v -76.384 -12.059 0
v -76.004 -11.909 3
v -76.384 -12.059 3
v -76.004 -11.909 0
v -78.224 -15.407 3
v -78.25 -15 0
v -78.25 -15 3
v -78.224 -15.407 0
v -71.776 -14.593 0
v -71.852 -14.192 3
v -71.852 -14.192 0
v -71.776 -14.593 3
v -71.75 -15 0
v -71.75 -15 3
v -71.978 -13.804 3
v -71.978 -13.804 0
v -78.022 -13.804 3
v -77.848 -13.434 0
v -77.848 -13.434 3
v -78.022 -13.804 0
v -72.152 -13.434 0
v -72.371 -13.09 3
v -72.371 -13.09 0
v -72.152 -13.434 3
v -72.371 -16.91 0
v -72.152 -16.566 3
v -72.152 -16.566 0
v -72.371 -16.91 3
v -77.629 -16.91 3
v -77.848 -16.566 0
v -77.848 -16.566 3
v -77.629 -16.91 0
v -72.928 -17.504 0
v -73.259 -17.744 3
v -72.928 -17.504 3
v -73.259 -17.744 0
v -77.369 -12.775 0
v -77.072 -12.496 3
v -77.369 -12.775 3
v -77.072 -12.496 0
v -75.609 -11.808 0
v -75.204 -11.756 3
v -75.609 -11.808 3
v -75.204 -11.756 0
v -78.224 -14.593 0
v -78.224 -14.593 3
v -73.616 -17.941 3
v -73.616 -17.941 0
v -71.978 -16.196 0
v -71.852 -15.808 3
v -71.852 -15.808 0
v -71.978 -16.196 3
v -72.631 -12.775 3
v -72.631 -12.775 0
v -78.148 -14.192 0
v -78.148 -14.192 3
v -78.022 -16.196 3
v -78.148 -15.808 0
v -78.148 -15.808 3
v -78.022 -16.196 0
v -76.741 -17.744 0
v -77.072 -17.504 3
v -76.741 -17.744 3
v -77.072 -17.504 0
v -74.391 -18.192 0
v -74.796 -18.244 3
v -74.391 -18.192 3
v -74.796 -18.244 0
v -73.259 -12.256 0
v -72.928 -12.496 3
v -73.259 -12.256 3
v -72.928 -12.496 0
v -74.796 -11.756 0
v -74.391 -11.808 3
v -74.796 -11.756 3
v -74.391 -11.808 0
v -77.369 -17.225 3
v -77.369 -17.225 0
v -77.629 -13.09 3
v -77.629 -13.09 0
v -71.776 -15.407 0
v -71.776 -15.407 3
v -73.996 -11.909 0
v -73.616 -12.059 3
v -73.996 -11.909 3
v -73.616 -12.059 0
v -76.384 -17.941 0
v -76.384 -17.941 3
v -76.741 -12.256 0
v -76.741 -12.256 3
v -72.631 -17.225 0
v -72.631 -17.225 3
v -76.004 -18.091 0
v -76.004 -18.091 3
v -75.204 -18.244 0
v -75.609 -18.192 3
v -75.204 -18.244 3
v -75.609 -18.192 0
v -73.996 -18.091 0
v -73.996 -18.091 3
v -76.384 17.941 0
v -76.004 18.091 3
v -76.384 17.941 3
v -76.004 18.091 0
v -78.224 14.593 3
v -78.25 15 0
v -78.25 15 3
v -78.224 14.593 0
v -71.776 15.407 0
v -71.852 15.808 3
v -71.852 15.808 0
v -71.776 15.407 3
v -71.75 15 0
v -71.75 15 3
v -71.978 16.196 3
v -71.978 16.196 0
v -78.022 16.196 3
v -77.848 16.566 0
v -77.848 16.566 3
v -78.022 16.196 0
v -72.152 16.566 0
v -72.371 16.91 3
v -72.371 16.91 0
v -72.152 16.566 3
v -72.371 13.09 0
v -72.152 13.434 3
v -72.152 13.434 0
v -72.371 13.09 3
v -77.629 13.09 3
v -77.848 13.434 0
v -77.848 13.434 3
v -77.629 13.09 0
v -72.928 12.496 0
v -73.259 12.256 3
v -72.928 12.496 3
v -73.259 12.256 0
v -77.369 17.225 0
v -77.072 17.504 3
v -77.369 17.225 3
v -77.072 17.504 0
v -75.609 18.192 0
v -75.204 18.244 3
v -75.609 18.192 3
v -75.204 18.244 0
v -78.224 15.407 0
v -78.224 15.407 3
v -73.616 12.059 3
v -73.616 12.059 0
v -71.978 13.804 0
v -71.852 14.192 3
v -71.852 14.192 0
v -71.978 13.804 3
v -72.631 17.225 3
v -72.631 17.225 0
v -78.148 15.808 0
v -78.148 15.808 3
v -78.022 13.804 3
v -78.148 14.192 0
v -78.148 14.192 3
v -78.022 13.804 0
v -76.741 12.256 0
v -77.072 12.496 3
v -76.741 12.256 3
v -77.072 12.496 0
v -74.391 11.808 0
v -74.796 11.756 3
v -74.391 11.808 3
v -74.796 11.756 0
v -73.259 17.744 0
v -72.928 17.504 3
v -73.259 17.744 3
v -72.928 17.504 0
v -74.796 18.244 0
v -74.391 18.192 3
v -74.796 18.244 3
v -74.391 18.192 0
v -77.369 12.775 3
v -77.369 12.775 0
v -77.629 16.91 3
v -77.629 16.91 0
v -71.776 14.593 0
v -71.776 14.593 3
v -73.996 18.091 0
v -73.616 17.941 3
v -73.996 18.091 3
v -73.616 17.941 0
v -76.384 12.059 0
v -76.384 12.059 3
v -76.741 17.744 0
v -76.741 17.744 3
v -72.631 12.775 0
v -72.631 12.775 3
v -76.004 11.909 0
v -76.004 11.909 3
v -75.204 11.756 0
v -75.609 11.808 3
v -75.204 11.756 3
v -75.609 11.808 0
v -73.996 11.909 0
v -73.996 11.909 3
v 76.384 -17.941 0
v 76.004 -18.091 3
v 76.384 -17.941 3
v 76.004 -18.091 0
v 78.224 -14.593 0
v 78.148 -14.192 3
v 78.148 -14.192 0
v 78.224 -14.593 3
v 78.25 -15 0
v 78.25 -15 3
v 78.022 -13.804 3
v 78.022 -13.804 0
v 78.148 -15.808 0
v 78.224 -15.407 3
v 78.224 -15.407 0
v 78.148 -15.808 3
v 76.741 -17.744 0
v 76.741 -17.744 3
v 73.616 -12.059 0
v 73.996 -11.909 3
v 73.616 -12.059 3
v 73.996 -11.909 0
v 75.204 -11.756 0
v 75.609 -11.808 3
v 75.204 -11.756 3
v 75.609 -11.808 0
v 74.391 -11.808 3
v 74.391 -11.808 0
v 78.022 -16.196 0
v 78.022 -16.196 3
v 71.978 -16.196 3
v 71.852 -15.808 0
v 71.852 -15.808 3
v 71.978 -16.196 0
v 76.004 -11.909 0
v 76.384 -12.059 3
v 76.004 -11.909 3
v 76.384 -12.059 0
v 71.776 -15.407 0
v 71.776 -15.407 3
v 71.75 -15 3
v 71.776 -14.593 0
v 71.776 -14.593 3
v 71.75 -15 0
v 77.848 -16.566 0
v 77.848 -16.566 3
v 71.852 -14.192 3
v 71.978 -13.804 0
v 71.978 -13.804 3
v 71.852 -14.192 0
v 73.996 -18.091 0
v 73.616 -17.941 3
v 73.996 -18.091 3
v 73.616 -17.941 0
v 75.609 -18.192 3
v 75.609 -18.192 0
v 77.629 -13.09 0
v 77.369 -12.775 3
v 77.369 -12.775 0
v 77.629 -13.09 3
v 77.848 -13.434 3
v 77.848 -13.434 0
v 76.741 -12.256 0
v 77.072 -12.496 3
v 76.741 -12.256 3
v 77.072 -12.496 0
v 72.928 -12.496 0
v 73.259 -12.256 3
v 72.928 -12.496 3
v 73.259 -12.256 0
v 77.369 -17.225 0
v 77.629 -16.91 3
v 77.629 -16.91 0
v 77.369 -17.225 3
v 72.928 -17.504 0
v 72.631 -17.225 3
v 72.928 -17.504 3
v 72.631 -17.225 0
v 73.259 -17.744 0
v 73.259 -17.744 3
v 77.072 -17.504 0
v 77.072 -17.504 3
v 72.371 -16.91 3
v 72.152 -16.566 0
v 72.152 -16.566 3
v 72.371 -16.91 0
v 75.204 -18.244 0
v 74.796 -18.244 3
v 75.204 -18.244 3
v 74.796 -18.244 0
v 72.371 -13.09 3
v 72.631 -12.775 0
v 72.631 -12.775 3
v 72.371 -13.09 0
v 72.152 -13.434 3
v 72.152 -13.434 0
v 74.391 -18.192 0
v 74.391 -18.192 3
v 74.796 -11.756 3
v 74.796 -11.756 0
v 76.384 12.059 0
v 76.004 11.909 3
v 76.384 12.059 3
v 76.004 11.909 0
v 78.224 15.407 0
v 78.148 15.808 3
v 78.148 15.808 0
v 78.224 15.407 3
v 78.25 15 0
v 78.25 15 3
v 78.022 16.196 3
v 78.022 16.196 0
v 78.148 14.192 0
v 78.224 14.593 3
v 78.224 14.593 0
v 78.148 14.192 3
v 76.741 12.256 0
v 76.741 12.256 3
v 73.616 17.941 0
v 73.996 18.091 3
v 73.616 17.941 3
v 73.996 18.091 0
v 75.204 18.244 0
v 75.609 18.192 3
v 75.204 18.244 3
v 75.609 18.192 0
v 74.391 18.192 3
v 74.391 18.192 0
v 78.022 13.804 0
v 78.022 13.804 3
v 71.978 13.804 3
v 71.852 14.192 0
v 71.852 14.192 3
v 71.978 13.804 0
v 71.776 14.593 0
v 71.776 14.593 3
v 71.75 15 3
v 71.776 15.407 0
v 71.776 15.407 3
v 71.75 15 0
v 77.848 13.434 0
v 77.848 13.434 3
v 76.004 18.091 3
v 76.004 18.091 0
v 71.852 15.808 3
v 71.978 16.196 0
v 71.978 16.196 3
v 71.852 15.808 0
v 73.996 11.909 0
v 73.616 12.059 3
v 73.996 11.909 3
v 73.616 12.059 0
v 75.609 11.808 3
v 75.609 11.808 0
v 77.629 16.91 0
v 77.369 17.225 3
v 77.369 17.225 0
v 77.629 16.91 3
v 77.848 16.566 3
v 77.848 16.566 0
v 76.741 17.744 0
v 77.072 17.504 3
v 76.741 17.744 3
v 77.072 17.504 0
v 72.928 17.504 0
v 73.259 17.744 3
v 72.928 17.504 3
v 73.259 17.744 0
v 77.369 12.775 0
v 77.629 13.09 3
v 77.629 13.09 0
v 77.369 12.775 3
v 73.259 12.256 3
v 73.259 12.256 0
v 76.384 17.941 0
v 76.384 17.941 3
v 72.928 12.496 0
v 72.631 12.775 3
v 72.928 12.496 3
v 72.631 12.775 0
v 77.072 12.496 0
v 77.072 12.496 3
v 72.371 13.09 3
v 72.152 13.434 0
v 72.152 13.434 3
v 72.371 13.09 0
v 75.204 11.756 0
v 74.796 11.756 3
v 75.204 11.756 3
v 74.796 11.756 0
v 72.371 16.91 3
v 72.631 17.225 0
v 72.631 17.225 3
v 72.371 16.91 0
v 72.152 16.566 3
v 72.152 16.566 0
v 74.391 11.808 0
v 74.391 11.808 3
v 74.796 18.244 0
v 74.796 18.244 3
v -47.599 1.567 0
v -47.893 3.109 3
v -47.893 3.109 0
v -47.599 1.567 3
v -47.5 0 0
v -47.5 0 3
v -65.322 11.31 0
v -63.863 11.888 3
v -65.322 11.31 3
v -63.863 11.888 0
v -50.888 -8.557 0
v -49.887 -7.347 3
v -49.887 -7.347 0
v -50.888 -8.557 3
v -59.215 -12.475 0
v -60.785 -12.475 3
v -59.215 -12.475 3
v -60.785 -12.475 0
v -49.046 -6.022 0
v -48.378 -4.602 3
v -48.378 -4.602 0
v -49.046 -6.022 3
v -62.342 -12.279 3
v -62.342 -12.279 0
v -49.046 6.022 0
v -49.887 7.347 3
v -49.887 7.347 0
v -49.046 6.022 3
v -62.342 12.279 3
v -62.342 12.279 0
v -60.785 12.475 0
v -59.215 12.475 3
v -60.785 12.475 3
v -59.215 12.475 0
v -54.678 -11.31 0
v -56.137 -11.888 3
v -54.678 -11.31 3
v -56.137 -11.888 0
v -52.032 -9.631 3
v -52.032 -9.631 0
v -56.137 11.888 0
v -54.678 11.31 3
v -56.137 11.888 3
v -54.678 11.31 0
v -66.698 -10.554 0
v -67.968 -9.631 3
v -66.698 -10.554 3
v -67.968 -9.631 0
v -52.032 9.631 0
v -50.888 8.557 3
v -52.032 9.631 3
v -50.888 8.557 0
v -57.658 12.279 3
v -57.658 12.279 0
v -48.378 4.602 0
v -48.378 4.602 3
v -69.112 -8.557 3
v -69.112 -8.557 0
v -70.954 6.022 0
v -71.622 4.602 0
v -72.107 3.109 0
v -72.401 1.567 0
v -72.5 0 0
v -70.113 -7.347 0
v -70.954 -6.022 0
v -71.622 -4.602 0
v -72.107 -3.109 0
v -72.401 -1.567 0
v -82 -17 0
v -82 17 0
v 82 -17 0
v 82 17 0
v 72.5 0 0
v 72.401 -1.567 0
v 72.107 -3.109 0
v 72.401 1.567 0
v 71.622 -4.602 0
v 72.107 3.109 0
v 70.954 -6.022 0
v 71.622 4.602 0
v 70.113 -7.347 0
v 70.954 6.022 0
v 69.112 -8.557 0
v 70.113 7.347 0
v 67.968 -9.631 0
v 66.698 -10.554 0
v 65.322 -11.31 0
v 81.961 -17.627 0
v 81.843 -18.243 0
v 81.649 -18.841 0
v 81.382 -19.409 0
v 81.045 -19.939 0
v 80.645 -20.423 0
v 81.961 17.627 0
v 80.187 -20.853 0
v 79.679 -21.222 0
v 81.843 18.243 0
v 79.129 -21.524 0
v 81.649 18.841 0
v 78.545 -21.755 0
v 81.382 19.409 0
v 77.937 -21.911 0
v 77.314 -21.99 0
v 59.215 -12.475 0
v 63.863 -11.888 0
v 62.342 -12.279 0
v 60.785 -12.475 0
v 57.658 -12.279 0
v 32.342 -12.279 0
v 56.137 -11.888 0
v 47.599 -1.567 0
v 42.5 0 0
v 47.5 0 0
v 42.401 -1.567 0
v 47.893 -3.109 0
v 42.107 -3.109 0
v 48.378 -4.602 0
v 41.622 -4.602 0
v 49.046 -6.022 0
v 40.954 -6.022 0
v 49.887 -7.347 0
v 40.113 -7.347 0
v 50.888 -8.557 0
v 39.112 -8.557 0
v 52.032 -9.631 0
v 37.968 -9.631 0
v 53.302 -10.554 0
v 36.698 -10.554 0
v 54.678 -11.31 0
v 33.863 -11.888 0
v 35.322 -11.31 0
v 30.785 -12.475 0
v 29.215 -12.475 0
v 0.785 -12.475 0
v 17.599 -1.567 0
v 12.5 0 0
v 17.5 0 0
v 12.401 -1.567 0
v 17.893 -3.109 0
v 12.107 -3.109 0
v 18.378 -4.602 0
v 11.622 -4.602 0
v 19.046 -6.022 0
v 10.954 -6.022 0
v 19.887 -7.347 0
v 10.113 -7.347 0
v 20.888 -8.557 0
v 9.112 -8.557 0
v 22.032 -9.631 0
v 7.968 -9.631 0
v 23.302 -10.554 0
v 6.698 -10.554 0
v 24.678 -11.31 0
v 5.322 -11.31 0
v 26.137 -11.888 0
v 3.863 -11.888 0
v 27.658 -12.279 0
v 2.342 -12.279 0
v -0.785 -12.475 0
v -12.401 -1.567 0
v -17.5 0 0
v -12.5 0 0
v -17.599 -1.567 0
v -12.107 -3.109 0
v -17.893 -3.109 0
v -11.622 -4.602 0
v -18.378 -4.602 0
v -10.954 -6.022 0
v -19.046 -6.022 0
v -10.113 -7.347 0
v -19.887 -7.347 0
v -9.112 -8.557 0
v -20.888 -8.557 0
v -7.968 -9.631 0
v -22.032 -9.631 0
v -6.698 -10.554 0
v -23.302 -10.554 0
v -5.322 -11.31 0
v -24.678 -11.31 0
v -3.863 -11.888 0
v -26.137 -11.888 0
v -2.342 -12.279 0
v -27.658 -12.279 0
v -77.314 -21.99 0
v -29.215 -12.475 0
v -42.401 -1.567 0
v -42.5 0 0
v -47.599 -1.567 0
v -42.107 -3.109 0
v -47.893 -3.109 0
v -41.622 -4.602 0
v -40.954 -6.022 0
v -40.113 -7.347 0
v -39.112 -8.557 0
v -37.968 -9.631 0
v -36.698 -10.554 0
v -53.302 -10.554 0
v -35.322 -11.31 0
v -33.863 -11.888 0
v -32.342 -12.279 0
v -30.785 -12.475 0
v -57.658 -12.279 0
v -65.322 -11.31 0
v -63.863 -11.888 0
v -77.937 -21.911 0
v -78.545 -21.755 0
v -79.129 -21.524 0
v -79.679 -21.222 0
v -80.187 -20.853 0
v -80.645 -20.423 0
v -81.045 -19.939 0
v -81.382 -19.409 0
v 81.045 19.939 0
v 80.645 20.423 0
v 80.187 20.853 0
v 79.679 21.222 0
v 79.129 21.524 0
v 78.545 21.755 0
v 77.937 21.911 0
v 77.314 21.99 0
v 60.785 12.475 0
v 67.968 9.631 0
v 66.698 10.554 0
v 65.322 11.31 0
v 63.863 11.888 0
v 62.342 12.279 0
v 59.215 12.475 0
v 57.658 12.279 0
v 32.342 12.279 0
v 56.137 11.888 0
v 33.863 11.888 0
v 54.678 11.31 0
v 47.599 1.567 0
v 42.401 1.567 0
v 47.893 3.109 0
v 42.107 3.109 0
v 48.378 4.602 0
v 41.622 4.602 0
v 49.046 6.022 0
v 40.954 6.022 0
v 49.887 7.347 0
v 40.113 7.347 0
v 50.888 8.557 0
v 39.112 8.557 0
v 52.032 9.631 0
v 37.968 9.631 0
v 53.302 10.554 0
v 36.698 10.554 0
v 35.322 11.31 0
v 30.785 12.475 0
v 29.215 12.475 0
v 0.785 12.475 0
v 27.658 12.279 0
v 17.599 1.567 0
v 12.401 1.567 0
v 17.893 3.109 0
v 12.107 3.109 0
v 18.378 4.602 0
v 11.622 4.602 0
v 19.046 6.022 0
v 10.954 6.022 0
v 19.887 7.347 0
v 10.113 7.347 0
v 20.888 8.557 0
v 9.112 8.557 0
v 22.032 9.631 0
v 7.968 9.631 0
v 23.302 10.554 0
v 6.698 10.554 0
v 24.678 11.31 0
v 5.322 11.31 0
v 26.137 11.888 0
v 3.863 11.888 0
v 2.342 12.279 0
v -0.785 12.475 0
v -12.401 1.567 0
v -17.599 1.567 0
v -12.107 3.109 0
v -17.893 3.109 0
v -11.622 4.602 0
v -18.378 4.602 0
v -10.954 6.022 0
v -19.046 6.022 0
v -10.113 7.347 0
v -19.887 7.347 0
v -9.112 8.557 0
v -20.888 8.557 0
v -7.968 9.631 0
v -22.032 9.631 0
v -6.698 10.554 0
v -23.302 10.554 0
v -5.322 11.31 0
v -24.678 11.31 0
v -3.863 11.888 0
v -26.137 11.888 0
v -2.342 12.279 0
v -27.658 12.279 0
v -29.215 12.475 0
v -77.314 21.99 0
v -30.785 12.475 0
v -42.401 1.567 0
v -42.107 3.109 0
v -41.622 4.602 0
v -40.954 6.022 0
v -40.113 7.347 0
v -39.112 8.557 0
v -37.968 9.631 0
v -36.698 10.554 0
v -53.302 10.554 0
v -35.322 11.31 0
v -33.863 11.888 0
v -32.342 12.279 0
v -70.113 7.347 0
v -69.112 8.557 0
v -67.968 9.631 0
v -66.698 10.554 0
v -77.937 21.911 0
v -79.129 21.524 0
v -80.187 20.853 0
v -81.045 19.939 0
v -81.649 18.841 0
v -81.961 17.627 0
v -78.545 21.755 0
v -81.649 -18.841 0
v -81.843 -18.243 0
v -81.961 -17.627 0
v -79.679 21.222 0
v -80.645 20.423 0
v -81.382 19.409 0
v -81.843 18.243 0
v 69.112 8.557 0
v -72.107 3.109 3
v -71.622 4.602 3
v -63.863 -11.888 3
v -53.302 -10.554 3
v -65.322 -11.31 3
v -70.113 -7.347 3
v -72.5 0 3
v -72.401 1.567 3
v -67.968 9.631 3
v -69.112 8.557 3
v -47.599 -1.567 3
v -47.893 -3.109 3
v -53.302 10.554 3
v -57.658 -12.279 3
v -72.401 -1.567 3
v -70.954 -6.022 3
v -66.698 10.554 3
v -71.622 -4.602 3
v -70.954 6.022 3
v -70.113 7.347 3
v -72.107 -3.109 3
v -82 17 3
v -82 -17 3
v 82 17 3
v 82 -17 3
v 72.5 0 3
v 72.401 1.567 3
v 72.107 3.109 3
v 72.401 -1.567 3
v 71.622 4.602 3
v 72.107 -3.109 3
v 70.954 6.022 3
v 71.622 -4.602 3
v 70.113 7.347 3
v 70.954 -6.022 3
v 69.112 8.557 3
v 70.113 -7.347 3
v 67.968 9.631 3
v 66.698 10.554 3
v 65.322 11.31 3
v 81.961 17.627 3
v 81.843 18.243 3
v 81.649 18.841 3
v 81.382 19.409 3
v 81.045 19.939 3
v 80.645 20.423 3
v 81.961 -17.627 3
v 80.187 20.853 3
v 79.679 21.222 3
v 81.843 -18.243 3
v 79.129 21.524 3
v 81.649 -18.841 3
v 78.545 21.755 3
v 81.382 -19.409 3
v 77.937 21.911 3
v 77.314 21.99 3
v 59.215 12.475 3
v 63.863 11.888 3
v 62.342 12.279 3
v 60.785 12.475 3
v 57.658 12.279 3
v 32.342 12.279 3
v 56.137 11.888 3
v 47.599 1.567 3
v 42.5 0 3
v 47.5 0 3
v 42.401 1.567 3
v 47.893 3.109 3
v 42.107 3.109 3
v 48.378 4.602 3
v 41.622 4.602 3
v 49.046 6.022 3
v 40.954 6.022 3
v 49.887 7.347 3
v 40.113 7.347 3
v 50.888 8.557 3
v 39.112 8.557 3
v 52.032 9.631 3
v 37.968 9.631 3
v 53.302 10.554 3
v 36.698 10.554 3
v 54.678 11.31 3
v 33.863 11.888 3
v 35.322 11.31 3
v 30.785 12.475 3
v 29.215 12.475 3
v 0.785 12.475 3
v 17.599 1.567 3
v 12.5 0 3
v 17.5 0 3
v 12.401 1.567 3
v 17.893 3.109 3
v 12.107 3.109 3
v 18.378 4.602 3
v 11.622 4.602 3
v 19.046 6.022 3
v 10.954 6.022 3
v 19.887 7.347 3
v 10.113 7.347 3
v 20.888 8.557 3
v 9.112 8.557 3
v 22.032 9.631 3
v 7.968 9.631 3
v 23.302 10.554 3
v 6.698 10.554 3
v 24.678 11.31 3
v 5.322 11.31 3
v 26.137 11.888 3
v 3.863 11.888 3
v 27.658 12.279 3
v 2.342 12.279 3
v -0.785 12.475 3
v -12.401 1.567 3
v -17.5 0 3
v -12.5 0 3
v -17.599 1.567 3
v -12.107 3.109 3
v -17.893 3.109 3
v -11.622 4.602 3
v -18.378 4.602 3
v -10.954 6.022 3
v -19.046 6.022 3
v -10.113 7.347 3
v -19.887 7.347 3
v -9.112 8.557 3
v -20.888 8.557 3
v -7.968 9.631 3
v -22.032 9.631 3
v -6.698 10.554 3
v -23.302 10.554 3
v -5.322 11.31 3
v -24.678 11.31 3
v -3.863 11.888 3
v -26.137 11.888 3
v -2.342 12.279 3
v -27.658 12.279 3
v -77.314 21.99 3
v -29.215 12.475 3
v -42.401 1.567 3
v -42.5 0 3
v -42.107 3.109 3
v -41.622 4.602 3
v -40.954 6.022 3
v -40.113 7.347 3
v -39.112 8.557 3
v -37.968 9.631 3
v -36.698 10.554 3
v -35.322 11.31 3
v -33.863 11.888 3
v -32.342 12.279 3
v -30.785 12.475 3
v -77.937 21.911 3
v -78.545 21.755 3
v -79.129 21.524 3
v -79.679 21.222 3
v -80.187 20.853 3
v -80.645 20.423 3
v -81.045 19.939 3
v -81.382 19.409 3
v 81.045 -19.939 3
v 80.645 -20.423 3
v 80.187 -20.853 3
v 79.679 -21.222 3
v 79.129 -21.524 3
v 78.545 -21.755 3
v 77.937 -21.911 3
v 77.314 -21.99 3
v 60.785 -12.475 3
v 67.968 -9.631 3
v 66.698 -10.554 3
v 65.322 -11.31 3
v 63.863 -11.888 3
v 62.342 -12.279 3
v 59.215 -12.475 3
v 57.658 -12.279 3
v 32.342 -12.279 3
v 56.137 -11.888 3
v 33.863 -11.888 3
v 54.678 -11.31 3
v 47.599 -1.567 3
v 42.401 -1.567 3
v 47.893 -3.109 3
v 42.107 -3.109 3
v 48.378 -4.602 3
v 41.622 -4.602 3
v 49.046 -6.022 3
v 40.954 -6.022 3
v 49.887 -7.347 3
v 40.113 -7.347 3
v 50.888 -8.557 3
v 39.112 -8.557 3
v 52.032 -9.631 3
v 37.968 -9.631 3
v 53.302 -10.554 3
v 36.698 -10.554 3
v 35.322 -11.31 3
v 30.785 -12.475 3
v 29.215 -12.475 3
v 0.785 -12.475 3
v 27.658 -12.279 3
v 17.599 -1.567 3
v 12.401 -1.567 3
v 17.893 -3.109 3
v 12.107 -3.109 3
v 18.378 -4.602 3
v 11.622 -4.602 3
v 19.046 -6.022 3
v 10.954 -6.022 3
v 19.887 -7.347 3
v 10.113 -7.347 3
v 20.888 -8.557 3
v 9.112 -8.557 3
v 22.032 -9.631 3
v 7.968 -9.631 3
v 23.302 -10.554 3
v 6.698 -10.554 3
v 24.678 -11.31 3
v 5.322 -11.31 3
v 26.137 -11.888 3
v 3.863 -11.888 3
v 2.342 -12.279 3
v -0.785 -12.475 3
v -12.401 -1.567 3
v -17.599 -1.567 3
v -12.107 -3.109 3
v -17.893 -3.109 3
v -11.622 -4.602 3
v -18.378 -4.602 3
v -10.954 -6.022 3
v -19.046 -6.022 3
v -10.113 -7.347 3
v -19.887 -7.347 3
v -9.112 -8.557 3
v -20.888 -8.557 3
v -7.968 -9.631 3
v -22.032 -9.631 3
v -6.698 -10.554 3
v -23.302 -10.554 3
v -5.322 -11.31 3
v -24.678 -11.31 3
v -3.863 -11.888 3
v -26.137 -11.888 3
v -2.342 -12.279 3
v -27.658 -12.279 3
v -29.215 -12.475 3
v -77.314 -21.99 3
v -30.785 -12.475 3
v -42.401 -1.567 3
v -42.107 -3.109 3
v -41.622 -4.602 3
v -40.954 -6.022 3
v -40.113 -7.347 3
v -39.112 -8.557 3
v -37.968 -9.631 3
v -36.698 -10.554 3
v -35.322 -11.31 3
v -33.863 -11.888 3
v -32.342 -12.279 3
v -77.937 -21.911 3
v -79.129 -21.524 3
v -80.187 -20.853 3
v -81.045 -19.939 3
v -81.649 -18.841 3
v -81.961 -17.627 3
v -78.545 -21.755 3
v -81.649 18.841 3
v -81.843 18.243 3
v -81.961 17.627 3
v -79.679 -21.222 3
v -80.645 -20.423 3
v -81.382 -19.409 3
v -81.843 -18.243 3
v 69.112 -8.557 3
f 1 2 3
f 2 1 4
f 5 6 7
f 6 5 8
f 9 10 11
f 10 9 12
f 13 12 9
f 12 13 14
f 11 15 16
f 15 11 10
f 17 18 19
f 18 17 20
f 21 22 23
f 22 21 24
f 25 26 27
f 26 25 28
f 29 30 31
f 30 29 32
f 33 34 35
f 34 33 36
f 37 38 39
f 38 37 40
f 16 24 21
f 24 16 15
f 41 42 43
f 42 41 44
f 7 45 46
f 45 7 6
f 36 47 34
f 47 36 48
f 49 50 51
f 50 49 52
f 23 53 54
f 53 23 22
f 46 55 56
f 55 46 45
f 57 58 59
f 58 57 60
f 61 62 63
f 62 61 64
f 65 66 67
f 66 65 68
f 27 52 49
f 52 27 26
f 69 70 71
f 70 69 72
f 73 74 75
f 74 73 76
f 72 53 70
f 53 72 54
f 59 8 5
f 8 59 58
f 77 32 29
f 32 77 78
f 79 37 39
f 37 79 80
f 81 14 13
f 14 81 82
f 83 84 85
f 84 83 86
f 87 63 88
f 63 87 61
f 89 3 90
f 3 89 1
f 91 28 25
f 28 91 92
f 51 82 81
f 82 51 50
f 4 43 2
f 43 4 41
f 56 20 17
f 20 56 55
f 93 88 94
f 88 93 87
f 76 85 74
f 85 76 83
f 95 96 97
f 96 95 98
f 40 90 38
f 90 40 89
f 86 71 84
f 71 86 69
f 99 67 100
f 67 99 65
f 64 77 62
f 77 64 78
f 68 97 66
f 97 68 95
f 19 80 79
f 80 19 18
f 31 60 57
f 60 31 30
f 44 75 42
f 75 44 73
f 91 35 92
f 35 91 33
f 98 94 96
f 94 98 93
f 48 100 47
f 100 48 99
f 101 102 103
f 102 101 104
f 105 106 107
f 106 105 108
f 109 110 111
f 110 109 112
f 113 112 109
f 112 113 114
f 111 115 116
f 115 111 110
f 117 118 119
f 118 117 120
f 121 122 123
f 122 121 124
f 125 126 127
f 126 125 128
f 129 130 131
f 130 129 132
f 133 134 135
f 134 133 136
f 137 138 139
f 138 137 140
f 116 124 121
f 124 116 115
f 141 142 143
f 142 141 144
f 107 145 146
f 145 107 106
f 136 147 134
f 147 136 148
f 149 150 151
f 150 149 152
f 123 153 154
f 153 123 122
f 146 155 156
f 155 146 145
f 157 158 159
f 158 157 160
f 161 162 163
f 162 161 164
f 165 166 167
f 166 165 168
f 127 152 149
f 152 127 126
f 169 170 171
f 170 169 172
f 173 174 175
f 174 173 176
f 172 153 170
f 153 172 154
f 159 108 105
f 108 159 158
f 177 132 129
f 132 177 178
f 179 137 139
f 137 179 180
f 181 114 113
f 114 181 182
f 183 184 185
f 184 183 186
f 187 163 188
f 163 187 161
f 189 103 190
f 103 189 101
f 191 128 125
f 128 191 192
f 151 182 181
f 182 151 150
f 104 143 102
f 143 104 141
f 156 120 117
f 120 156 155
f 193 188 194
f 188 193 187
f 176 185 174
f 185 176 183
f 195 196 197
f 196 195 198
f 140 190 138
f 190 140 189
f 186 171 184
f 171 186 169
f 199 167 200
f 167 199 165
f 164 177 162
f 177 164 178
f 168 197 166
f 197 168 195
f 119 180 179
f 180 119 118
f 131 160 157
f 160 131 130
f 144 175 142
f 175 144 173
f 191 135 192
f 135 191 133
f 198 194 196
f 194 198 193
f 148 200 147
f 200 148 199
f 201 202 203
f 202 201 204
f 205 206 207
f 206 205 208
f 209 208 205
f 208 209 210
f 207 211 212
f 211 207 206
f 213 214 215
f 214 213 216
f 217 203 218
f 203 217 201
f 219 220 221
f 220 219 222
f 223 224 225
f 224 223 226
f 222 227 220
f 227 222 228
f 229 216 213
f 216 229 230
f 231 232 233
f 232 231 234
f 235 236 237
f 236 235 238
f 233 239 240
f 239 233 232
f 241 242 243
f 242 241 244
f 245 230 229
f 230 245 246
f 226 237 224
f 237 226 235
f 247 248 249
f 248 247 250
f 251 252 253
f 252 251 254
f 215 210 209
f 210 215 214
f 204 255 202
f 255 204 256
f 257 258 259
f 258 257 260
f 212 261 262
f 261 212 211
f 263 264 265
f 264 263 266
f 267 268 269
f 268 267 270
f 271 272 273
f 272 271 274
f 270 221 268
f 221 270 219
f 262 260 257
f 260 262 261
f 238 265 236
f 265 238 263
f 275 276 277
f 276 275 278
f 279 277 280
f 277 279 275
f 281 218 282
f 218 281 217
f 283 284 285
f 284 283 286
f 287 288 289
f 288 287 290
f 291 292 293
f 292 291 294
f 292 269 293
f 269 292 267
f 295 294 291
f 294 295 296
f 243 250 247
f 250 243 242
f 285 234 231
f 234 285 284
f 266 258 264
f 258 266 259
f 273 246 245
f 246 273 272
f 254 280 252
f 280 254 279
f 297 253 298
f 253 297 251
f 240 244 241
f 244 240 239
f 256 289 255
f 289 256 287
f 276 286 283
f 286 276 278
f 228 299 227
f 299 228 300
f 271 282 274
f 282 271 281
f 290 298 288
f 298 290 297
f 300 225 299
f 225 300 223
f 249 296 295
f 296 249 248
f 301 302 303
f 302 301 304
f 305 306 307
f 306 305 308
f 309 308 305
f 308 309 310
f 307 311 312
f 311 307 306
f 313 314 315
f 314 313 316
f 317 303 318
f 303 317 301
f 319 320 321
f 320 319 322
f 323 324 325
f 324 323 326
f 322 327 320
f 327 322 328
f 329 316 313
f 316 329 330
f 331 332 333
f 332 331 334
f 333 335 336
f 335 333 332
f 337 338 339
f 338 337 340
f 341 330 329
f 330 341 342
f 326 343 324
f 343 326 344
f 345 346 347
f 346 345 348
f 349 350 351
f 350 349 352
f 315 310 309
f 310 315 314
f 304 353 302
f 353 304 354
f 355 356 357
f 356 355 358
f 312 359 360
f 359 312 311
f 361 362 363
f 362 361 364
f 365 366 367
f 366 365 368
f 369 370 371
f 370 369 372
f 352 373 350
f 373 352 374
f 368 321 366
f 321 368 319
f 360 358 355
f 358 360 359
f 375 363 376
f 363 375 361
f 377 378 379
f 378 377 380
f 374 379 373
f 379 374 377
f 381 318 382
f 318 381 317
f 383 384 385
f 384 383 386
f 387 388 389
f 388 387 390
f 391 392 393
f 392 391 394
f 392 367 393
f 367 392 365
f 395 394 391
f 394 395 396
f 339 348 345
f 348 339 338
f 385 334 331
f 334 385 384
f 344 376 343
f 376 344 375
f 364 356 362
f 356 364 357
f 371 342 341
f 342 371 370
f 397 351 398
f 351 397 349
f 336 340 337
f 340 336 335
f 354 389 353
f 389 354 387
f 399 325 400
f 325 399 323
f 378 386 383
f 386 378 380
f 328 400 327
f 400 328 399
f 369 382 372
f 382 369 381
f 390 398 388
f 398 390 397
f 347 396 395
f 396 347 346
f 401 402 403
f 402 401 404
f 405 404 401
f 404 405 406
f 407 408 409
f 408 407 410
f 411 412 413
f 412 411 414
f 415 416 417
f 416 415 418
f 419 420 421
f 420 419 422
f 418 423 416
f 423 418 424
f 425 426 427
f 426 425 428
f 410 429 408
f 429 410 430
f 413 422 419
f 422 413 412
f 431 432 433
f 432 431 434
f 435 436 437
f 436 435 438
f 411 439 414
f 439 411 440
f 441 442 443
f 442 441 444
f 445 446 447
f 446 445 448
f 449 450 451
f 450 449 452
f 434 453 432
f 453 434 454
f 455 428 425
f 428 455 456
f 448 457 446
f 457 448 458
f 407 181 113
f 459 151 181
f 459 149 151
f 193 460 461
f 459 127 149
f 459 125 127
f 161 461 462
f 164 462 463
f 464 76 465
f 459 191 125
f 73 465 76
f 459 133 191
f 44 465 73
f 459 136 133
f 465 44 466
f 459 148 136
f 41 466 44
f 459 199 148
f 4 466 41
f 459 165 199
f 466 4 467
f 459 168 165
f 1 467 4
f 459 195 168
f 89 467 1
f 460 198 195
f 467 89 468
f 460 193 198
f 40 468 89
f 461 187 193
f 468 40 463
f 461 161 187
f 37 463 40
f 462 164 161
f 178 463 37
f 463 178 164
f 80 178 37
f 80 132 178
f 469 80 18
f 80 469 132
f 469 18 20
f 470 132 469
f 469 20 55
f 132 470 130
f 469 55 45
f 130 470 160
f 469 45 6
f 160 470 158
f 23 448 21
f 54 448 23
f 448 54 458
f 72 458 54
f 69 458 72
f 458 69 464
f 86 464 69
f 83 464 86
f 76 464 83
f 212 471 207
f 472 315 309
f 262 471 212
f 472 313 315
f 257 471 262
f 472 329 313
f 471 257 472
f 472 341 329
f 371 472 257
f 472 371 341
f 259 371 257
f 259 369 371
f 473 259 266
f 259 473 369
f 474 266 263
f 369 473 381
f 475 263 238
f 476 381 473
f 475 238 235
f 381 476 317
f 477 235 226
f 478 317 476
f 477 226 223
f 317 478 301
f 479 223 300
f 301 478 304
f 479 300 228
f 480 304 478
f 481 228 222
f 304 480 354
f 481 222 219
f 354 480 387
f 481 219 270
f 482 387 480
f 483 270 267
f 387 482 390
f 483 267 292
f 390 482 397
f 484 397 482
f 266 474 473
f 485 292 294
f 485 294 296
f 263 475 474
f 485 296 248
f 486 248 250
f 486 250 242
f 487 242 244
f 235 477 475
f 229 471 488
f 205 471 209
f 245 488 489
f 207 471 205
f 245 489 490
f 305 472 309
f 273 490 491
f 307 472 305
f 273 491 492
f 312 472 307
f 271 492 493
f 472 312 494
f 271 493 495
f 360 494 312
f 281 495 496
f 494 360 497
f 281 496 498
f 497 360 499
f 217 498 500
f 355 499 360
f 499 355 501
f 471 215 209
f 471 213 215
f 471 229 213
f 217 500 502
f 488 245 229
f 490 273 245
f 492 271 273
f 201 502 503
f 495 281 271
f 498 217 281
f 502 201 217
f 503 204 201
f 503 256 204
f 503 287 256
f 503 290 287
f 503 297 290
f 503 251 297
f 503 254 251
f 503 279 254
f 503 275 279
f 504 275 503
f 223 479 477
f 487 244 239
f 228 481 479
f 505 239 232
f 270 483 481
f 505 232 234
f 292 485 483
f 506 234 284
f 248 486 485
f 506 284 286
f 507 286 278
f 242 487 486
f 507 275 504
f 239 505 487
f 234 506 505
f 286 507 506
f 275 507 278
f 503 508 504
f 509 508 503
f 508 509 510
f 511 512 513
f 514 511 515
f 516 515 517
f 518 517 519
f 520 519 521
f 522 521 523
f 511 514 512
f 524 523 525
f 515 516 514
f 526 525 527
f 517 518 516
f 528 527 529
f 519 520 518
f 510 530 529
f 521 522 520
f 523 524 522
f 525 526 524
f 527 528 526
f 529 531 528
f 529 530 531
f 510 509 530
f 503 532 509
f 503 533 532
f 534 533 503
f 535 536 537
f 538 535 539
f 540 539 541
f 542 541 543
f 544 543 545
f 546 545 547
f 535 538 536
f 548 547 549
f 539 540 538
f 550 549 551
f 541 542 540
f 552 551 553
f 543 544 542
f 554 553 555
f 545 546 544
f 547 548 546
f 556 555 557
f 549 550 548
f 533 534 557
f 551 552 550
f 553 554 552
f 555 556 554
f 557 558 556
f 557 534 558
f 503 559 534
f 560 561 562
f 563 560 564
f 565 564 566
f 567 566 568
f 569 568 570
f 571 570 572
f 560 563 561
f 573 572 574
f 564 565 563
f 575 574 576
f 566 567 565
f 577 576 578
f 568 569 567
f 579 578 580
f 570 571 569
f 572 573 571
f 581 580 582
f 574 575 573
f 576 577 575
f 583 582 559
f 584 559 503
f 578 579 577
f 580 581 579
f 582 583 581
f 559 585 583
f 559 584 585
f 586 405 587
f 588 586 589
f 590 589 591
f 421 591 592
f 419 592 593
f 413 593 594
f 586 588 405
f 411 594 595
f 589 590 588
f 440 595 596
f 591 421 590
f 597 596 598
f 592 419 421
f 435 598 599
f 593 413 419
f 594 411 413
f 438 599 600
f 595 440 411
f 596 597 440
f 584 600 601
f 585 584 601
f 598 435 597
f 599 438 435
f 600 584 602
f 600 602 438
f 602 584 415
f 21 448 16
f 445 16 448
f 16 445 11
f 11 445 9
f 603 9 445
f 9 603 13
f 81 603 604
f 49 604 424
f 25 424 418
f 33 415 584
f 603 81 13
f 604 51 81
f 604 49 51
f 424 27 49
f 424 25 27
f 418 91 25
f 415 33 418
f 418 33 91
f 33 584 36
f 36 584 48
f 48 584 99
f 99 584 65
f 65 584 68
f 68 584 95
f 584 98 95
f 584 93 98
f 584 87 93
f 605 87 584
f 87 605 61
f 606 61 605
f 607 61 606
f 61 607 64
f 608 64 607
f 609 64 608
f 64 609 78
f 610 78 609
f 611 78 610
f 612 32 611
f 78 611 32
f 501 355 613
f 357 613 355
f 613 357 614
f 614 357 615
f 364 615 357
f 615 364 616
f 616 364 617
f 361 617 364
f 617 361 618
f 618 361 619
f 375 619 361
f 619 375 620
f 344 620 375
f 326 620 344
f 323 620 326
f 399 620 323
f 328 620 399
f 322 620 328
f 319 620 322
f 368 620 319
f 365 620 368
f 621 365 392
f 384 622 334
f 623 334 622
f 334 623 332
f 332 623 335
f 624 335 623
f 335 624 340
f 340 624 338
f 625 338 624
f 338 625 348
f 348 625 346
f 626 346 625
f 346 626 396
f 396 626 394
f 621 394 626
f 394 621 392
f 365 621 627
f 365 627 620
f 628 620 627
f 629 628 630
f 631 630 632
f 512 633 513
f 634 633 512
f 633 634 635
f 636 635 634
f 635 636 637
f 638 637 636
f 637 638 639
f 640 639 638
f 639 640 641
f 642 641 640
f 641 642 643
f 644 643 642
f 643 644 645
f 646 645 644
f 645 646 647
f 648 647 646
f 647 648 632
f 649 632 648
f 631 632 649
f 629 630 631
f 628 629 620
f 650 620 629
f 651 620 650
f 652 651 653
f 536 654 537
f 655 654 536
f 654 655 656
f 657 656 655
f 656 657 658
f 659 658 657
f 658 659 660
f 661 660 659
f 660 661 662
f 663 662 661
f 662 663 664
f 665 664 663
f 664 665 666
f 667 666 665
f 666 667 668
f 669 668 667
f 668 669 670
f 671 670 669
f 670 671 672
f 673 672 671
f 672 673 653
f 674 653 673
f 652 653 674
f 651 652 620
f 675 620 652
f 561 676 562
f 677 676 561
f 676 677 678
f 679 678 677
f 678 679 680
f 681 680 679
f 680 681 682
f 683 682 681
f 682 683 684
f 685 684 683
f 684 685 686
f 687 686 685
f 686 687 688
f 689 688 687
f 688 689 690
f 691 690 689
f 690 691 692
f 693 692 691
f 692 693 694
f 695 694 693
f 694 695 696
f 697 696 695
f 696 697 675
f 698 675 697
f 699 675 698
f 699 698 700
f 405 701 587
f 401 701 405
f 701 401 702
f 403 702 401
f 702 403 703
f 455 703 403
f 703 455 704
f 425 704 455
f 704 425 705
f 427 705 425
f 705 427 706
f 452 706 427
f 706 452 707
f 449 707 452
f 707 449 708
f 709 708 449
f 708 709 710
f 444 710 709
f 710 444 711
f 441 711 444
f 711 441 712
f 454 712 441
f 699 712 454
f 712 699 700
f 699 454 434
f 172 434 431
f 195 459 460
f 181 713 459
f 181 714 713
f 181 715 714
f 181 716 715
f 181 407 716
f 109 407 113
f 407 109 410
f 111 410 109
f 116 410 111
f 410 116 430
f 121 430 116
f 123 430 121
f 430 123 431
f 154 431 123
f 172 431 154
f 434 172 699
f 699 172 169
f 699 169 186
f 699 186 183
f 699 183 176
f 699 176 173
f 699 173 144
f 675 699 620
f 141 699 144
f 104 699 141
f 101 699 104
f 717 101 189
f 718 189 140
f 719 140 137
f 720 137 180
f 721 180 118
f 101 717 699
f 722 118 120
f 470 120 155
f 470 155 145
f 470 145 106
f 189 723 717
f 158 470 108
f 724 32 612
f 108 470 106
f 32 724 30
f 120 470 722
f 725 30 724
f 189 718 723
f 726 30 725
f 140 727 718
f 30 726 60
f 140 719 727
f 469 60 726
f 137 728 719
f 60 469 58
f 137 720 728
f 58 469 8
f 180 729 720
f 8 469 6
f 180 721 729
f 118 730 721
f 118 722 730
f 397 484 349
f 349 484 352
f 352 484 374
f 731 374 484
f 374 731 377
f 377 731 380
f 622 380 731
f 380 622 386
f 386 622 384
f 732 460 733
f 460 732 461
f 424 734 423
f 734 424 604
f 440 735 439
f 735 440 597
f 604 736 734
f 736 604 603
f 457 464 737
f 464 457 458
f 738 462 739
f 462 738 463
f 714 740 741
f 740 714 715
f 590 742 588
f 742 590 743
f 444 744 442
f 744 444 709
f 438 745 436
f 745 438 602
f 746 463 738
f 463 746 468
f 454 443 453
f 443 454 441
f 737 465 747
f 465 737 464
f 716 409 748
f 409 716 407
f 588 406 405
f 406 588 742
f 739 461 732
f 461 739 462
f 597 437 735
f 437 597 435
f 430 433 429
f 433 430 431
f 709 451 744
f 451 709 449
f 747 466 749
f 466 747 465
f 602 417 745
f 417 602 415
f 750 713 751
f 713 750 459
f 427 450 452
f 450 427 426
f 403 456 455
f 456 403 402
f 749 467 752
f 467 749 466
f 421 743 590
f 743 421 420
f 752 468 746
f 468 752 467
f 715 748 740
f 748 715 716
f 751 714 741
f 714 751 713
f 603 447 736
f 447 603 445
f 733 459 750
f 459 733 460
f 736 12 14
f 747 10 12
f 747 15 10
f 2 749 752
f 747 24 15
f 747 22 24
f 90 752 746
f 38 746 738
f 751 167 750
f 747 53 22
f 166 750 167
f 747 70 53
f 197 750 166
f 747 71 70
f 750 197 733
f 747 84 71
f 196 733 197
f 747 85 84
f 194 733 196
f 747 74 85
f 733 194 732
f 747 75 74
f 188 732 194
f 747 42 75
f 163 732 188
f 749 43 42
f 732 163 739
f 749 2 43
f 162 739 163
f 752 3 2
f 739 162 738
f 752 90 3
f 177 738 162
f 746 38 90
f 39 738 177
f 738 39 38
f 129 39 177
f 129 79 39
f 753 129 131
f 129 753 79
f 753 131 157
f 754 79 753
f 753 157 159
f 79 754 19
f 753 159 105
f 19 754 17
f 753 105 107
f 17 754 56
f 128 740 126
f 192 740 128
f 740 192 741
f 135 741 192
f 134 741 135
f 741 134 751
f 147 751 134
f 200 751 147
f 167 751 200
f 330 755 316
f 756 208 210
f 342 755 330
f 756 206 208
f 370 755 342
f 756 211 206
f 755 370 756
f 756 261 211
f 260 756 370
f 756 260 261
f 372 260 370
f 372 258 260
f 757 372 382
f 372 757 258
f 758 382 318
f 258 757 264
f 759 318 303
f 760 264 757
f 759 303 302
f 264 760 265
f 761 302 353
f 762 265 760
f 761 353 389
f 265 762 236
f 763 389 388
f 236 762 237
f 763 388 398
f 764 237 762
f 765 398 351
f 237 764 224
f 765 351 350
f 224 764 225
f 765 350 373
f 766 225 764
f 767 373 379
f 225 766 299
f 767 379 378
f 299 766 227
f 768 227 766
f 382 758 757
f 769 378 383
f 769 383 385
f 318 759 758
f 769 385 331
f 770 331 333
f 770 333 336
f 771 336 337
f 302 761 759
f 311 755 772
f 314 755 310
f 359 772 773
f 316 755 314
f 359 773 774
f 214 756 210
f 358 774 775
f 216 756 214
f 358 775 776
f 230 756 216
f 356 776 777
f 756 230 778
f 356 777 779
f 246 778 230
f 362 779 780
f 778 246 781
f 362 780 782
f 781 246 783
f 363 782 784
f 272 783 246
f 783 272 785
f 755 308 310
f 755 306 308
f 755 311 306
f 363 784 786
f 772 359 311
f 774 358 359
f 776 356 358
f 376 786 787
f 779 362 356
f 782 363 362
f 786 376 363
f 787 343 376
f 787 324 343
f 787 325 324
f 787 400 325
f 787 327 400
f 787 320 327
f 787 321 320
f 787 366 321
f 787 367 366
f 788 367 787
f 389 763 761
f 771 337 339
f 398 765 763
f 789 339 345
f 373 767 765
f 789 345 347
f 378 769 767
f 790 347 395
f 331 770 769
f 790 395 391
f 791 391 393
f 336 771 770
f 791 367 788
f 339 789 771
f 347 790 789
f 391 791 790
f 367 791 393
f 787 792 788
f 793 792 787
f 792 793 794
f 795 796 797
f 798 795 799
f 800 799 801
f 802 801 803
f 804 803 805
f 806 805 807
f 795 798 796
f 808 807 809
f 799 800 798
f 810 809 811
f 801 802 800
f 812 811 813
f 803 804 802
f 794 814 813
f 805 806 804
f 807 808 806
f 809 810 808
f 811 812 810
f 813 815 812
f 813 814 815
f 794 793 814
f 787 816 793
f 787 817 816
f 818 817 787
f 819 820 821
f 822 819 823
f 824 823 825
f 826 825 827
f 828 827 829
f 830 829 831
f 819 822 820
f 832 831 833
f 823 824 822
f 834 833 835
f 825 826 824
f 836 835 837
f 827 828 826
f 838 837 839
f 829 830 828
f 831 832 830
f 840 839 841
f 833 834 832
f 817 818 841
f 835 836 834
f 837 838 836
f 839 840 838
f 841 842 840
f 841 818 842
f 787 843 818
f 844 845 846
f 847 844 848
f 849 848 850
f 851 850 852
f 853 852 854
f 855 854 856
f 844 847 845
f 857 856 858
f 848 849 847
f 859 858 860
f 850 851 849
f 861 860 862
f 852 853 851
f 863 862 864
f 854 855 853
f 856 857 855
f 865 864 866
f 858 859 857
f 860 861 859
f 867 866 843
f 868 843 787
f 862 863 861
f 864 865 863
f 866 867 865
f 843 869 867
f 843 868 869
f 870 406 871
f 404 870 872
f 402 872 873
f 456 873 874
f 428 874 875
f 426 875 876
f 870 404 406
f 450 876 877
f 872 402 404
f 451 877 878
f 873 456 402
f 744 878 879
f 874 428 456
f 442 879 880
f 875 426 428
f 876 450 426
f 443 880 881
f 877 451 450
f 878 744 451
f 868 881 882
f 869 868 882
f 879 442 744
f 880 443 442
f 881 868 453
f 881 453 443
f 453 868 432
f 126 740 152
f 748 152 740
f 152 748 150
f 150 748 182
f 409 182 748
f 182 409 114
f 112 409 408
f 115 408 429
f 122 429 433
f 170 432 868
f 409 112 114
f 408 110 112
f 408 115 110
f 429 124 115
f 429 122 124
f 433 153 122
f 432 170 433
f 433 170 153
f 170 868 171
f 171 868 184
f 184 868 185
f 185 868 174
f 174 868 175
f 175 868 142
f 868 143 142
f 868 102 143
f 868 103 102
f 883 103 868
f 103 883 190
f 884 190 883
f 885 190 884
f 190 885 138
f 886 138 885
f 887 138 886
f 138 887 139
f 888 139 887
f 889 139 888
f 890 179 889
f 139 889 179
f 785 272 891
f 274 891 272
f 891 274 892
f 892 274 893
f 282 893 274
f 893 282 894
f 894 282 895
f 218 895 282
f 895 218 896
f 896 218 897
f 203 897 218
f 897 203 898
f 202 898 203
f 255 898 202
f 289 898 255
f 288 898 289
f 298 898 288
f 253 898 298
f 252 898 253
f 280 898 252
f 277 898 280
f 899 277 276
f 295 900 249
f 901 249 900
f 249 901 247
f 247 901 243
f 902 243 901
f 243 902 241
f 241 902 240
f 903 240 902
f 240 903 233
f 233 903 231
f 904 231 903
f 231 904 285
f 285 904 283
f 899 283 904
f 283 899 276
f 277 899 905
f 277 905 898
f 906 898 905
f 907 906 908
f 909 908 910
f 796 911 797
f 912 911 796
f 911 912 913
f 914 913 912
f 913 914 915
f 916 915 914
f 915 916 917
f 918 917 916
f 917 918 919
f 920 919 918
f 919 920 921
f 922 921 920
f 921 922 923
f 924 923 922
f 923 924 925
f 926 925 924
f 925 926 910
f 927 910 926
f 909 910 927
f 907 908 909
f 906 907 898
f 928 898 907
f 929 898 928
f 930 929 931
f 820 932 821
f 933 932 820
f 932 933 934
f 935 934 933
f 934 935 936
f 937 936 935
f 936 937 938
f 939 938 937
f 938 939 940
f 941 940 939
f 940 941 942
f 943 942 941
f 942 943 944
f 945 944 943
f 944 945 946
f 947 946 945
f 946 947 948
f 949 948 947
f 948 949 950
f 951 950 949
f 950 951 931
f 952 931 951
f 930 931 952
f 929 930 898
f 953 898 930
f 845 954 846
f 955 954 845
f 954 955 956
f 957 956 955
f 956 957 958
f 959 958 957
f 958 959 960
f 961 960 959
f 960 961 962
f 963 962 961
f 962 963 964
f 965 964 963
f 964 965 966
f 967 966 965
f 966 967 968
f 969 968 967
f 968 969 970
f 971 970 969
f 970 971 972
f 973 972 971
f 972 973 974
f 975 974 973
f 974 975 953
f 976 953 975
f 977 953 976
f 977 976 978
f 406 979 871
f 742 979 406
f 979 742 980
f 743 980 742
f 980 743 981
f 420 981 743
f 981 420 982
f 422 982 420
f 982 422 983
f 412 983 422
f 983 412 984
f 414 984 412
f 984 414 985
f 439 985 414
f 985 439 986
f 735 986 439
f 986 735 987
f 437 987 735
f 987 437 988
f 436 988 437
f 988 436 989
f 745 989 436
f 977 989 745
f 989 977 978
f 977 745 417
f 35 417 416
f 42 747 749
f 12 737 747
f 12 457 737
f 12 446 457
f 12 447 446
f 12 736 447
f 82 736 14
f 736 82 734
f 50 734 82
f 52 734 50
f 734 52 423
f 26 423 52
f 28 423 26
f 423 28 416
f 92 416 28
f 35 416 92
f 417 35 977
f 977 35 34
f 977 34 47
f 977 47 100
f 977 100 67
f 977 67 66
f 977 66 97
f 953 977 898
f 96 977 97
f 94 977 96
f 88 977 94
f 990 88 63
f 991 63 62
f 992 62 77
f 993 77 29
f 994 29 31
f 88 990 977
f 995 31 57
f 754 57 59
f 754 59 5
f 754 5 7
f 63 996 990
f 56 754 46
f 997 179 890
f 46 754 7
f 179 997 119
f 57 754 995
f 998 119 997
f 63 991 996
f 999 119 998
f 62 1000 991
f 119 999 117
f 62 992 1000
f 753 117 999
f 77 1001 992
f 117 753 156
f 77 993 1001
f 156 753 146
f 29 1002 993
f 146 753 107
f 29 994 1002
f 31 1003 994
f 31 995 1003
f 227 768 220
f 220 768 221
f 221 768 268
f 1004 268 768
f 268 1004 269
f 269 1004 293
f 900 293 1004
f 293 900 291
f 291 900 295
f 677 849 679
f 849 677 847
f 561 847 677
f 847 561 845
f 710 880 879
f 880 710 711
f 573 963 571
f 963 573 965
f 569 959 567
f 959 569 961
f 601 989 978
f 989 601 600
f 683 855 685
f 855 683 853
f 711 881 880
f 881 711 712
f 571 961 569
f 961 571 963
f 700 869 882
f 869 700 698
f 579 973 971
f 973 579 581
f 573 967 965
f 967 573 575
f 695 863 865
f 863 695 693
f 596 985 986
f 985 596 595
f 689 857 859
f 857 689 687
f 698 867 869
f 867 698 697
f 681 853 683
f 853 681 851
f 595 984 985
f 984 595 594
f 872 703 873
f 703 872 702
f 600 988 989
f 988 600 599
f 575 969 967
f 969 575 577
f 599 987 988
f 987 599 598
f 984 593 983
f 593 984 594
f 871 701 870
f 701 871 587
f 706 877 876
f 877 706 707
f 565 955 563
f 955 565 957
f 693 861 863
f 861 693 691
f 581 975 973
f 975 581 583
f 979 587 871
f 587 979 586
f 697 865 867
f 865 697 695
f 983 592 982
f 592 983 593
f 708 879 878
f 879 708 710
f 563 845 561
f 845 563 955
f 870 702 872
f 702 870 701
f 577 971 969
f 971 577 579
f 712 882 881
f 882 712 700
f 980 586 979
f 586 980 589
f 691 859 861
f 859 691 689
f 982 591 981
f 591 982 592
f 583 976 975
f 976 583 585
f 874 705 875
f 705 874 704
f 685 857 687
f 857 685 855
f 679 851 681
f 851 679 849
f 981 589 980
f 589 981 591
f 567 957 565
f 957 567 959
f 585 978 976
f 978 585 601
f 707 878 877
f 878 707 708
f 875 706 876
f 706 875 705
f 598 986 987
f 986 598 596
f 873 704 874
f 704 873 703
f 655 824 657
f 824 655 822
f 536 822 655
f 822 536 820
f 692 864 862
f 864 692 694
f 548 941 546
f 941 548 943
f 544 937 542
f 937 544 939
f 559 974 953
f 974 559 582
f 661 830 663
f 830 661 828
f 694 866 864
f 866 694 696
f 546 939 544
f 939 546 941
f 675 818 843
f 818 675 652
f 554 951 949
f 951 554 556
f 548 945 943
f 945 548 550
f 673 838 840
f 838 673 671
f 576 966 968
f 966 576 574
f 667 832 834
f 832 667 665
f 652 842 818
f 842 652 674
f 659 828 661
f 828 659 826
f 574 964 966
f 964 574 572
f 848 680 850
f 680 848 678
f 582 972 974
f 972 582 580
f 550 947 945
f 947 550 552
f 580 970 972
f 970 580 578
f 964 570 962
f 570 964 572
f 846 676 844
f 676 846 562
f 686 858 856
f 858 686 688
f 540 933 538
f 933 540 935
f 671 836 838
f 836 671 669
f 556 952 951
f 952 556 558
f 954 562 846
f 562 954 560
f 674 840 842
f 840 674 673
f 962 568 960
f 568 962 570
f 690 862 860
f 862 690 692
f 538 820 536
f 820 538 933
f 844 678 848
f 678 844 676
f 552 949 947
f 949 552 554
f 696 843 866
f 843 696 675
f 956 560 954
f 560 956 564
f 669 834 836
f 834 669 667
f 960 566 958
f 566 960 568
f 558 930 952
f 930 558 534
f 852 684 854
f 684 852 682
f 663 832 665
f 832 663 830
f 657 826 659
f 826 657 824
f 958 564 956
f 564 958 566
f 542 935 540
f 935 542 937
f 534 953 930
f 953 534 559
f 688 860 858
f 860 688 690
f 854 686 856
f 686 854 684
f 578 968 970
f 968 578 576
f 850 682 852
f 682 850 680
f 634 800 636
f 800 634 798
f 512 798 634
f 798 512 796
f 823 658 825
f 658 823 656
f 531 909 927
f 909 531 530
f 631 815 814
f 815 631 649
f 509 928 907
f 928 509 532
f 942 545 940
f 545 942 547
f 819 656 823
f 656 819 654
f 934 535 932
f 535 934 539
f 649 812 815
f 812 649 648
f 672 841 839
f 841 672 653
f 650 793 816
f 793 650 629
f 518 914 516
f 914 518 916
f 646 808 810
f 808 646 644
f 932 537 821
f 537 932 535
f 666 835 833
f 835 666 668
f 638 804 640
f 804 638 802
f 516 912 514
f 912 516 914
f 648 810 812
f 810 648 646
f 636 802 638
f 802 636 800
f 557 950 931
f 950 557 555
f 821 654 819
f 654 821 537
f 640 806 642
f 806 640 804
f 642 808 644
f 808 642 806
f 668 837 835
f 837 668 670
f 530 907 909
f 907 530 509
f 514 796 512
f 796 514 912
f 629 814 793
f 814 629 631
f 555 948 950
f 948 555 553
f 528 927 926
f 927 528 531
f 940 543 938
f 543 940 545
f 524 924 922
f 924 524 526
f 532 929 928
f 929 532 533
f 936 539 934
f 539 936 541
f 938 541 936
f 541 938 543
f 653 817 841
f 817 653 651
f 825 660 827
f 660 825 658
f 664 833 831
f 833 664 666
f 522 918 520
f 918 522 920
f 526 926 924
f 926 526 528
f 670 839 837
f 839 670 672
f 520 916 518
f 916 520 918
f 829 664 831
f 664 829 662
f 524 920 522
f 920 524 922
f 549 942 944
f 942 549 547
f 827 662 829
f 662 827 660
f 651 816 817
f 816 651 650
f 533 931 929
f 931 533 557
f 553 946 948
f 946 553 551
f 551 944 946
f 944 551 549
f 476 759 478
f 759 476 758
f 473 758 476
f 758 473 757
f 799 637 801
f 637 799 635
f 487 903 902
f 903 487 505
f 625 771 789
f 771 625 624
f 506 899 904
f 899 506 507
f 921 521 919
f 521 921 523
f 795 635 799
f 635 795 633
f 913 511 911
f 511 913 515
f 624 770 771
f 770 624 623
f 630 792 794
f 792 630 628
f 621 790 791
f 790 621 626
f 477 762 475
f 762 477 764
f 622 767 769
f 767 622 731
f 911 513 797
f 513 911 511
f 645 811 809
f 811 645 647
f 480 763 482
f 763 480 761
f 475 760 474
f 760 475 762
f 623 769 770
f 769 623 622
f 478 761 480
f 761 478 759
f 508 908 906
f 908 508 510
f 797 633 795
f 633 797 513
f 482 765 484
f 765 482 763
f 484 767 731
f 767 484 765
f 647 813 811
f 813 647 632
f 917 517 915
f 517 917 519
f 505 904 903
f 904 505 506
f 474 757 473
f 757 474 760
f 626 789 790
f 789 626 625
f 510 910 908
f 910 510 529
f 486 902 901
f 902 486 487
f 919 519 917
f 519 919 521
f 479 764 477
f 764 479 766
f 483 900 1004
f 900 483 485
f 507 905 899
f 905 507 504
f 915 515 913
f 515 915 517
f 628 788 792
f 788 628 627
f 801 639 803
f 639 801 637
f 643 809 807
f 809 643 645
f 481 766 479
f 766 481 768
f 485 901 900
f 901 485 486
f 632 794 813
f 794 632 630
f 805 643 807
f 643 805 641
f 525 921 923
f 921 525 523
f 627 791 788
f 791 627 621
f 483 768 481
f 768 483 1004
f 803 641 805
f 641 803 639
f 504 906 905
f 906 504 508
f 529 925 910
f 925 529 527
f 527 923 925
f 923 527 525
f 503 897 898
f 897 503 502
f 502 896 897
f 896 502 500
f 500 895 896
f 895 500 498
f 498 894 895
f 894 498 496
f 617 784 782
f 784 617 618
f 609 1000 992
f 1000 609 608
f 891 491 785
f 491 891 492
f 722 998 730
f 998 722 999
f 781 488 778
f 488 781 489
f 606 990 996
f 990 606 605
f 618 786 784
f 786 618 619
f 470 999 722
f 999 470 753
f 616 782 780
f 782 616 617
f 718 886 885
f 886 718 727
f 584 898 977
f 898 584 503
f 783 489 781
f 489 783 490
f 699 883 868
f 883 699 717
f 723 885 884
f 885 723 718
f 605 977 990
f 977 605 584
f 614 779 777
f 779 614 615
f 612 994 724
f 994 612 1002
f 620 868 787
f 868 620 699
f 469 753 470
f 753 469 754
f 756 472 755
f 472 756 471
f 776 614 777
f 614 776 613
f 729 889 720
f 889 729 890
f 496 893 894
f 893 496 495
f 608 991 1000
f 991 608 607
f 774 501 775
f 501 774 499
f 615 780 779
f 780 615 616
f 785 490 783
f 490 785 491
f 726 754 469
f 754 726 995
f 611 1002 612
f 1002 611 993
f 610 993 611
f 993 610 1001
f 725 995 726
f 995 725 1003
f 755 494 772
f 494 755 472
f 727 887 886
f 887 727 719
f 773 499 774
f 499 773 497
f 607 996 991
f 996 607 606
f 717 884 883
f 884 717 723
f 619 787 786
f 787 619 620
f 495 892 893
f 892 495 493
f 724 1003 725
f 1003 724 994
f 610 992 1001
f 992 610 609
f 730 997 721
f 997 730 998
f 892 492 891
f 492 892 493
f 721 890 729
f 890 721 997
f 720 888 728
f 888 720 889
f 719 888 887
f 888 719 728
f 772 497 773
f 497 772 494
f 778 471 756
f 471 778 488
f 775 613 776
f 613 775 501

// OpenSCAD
$fn = 50;

difference() {
	union() {
		hull() {
			translate(v = [-77.0, 17.0, 0]) {
				cylinder(h = 3, r = 5);
			}
			translate(v = [77.0, 17.0, 0]) {
				cylinder(h = 3, r = 5);
			}
			translate(v = [-77.0, -17.0, 0]) {
				cylinder(h = 3, r = 5);
			}
			translate(v = [77.0, -17.0, 0]) {
				cylinder(h = 3, r = 5);
			}
		}
	}
	union() {
		translate(v = [-75.0, -15.0, -100.0]) {
			cylinder(h = 200, r = 3.25);
		}
		translate(v = [-75.0, 15.0, -100.0]) {
			cylinder(h = 200, r = 3.25);
		}
		translate(v = [75.0, -15.0, -100.0]) {
			cylinder(h = 200, r = 3.25);
		}
		translate(v = [75.0, 15.0, -100.0]) {
			cylinder(h = 200, r = 3.25);
		}
		translate(v = [-75.0, -15.0, -100.0]) {
			cylinder(h = 200, r = 1.8);
		}
		translate(v = [-75.0, 15.0, -100.0]) {
			cylinder(h = 200, r = 1.8);
		}
		translate(v = [75.0, -15.0, -100.0]) {
			cylinder(h = 200, r = 1.8);
		}
		translate(v = [75.0, 15.0, -100.0]) {
			cylinder(h = 200, r = 1.8);
		}
		translate(v = [-60.0, 0, 0.0]) {
			cylinder(h = 3, r = 12.5);
		}
		translate(v = [-30.0, 0, 0.0]) {
			cylinder(h = 3, r = 12.5);
		}
		cylinder(h = 3, r = 12.5);
		translate(v = [30.0, 0, 0.0]) {
			cylinder(h = 3, r = 12.5);
		}
		translate(v = [60.0, 0, 0.0]) {
			cylinder(h = 3, r = 12.5);
		}
	}
}
